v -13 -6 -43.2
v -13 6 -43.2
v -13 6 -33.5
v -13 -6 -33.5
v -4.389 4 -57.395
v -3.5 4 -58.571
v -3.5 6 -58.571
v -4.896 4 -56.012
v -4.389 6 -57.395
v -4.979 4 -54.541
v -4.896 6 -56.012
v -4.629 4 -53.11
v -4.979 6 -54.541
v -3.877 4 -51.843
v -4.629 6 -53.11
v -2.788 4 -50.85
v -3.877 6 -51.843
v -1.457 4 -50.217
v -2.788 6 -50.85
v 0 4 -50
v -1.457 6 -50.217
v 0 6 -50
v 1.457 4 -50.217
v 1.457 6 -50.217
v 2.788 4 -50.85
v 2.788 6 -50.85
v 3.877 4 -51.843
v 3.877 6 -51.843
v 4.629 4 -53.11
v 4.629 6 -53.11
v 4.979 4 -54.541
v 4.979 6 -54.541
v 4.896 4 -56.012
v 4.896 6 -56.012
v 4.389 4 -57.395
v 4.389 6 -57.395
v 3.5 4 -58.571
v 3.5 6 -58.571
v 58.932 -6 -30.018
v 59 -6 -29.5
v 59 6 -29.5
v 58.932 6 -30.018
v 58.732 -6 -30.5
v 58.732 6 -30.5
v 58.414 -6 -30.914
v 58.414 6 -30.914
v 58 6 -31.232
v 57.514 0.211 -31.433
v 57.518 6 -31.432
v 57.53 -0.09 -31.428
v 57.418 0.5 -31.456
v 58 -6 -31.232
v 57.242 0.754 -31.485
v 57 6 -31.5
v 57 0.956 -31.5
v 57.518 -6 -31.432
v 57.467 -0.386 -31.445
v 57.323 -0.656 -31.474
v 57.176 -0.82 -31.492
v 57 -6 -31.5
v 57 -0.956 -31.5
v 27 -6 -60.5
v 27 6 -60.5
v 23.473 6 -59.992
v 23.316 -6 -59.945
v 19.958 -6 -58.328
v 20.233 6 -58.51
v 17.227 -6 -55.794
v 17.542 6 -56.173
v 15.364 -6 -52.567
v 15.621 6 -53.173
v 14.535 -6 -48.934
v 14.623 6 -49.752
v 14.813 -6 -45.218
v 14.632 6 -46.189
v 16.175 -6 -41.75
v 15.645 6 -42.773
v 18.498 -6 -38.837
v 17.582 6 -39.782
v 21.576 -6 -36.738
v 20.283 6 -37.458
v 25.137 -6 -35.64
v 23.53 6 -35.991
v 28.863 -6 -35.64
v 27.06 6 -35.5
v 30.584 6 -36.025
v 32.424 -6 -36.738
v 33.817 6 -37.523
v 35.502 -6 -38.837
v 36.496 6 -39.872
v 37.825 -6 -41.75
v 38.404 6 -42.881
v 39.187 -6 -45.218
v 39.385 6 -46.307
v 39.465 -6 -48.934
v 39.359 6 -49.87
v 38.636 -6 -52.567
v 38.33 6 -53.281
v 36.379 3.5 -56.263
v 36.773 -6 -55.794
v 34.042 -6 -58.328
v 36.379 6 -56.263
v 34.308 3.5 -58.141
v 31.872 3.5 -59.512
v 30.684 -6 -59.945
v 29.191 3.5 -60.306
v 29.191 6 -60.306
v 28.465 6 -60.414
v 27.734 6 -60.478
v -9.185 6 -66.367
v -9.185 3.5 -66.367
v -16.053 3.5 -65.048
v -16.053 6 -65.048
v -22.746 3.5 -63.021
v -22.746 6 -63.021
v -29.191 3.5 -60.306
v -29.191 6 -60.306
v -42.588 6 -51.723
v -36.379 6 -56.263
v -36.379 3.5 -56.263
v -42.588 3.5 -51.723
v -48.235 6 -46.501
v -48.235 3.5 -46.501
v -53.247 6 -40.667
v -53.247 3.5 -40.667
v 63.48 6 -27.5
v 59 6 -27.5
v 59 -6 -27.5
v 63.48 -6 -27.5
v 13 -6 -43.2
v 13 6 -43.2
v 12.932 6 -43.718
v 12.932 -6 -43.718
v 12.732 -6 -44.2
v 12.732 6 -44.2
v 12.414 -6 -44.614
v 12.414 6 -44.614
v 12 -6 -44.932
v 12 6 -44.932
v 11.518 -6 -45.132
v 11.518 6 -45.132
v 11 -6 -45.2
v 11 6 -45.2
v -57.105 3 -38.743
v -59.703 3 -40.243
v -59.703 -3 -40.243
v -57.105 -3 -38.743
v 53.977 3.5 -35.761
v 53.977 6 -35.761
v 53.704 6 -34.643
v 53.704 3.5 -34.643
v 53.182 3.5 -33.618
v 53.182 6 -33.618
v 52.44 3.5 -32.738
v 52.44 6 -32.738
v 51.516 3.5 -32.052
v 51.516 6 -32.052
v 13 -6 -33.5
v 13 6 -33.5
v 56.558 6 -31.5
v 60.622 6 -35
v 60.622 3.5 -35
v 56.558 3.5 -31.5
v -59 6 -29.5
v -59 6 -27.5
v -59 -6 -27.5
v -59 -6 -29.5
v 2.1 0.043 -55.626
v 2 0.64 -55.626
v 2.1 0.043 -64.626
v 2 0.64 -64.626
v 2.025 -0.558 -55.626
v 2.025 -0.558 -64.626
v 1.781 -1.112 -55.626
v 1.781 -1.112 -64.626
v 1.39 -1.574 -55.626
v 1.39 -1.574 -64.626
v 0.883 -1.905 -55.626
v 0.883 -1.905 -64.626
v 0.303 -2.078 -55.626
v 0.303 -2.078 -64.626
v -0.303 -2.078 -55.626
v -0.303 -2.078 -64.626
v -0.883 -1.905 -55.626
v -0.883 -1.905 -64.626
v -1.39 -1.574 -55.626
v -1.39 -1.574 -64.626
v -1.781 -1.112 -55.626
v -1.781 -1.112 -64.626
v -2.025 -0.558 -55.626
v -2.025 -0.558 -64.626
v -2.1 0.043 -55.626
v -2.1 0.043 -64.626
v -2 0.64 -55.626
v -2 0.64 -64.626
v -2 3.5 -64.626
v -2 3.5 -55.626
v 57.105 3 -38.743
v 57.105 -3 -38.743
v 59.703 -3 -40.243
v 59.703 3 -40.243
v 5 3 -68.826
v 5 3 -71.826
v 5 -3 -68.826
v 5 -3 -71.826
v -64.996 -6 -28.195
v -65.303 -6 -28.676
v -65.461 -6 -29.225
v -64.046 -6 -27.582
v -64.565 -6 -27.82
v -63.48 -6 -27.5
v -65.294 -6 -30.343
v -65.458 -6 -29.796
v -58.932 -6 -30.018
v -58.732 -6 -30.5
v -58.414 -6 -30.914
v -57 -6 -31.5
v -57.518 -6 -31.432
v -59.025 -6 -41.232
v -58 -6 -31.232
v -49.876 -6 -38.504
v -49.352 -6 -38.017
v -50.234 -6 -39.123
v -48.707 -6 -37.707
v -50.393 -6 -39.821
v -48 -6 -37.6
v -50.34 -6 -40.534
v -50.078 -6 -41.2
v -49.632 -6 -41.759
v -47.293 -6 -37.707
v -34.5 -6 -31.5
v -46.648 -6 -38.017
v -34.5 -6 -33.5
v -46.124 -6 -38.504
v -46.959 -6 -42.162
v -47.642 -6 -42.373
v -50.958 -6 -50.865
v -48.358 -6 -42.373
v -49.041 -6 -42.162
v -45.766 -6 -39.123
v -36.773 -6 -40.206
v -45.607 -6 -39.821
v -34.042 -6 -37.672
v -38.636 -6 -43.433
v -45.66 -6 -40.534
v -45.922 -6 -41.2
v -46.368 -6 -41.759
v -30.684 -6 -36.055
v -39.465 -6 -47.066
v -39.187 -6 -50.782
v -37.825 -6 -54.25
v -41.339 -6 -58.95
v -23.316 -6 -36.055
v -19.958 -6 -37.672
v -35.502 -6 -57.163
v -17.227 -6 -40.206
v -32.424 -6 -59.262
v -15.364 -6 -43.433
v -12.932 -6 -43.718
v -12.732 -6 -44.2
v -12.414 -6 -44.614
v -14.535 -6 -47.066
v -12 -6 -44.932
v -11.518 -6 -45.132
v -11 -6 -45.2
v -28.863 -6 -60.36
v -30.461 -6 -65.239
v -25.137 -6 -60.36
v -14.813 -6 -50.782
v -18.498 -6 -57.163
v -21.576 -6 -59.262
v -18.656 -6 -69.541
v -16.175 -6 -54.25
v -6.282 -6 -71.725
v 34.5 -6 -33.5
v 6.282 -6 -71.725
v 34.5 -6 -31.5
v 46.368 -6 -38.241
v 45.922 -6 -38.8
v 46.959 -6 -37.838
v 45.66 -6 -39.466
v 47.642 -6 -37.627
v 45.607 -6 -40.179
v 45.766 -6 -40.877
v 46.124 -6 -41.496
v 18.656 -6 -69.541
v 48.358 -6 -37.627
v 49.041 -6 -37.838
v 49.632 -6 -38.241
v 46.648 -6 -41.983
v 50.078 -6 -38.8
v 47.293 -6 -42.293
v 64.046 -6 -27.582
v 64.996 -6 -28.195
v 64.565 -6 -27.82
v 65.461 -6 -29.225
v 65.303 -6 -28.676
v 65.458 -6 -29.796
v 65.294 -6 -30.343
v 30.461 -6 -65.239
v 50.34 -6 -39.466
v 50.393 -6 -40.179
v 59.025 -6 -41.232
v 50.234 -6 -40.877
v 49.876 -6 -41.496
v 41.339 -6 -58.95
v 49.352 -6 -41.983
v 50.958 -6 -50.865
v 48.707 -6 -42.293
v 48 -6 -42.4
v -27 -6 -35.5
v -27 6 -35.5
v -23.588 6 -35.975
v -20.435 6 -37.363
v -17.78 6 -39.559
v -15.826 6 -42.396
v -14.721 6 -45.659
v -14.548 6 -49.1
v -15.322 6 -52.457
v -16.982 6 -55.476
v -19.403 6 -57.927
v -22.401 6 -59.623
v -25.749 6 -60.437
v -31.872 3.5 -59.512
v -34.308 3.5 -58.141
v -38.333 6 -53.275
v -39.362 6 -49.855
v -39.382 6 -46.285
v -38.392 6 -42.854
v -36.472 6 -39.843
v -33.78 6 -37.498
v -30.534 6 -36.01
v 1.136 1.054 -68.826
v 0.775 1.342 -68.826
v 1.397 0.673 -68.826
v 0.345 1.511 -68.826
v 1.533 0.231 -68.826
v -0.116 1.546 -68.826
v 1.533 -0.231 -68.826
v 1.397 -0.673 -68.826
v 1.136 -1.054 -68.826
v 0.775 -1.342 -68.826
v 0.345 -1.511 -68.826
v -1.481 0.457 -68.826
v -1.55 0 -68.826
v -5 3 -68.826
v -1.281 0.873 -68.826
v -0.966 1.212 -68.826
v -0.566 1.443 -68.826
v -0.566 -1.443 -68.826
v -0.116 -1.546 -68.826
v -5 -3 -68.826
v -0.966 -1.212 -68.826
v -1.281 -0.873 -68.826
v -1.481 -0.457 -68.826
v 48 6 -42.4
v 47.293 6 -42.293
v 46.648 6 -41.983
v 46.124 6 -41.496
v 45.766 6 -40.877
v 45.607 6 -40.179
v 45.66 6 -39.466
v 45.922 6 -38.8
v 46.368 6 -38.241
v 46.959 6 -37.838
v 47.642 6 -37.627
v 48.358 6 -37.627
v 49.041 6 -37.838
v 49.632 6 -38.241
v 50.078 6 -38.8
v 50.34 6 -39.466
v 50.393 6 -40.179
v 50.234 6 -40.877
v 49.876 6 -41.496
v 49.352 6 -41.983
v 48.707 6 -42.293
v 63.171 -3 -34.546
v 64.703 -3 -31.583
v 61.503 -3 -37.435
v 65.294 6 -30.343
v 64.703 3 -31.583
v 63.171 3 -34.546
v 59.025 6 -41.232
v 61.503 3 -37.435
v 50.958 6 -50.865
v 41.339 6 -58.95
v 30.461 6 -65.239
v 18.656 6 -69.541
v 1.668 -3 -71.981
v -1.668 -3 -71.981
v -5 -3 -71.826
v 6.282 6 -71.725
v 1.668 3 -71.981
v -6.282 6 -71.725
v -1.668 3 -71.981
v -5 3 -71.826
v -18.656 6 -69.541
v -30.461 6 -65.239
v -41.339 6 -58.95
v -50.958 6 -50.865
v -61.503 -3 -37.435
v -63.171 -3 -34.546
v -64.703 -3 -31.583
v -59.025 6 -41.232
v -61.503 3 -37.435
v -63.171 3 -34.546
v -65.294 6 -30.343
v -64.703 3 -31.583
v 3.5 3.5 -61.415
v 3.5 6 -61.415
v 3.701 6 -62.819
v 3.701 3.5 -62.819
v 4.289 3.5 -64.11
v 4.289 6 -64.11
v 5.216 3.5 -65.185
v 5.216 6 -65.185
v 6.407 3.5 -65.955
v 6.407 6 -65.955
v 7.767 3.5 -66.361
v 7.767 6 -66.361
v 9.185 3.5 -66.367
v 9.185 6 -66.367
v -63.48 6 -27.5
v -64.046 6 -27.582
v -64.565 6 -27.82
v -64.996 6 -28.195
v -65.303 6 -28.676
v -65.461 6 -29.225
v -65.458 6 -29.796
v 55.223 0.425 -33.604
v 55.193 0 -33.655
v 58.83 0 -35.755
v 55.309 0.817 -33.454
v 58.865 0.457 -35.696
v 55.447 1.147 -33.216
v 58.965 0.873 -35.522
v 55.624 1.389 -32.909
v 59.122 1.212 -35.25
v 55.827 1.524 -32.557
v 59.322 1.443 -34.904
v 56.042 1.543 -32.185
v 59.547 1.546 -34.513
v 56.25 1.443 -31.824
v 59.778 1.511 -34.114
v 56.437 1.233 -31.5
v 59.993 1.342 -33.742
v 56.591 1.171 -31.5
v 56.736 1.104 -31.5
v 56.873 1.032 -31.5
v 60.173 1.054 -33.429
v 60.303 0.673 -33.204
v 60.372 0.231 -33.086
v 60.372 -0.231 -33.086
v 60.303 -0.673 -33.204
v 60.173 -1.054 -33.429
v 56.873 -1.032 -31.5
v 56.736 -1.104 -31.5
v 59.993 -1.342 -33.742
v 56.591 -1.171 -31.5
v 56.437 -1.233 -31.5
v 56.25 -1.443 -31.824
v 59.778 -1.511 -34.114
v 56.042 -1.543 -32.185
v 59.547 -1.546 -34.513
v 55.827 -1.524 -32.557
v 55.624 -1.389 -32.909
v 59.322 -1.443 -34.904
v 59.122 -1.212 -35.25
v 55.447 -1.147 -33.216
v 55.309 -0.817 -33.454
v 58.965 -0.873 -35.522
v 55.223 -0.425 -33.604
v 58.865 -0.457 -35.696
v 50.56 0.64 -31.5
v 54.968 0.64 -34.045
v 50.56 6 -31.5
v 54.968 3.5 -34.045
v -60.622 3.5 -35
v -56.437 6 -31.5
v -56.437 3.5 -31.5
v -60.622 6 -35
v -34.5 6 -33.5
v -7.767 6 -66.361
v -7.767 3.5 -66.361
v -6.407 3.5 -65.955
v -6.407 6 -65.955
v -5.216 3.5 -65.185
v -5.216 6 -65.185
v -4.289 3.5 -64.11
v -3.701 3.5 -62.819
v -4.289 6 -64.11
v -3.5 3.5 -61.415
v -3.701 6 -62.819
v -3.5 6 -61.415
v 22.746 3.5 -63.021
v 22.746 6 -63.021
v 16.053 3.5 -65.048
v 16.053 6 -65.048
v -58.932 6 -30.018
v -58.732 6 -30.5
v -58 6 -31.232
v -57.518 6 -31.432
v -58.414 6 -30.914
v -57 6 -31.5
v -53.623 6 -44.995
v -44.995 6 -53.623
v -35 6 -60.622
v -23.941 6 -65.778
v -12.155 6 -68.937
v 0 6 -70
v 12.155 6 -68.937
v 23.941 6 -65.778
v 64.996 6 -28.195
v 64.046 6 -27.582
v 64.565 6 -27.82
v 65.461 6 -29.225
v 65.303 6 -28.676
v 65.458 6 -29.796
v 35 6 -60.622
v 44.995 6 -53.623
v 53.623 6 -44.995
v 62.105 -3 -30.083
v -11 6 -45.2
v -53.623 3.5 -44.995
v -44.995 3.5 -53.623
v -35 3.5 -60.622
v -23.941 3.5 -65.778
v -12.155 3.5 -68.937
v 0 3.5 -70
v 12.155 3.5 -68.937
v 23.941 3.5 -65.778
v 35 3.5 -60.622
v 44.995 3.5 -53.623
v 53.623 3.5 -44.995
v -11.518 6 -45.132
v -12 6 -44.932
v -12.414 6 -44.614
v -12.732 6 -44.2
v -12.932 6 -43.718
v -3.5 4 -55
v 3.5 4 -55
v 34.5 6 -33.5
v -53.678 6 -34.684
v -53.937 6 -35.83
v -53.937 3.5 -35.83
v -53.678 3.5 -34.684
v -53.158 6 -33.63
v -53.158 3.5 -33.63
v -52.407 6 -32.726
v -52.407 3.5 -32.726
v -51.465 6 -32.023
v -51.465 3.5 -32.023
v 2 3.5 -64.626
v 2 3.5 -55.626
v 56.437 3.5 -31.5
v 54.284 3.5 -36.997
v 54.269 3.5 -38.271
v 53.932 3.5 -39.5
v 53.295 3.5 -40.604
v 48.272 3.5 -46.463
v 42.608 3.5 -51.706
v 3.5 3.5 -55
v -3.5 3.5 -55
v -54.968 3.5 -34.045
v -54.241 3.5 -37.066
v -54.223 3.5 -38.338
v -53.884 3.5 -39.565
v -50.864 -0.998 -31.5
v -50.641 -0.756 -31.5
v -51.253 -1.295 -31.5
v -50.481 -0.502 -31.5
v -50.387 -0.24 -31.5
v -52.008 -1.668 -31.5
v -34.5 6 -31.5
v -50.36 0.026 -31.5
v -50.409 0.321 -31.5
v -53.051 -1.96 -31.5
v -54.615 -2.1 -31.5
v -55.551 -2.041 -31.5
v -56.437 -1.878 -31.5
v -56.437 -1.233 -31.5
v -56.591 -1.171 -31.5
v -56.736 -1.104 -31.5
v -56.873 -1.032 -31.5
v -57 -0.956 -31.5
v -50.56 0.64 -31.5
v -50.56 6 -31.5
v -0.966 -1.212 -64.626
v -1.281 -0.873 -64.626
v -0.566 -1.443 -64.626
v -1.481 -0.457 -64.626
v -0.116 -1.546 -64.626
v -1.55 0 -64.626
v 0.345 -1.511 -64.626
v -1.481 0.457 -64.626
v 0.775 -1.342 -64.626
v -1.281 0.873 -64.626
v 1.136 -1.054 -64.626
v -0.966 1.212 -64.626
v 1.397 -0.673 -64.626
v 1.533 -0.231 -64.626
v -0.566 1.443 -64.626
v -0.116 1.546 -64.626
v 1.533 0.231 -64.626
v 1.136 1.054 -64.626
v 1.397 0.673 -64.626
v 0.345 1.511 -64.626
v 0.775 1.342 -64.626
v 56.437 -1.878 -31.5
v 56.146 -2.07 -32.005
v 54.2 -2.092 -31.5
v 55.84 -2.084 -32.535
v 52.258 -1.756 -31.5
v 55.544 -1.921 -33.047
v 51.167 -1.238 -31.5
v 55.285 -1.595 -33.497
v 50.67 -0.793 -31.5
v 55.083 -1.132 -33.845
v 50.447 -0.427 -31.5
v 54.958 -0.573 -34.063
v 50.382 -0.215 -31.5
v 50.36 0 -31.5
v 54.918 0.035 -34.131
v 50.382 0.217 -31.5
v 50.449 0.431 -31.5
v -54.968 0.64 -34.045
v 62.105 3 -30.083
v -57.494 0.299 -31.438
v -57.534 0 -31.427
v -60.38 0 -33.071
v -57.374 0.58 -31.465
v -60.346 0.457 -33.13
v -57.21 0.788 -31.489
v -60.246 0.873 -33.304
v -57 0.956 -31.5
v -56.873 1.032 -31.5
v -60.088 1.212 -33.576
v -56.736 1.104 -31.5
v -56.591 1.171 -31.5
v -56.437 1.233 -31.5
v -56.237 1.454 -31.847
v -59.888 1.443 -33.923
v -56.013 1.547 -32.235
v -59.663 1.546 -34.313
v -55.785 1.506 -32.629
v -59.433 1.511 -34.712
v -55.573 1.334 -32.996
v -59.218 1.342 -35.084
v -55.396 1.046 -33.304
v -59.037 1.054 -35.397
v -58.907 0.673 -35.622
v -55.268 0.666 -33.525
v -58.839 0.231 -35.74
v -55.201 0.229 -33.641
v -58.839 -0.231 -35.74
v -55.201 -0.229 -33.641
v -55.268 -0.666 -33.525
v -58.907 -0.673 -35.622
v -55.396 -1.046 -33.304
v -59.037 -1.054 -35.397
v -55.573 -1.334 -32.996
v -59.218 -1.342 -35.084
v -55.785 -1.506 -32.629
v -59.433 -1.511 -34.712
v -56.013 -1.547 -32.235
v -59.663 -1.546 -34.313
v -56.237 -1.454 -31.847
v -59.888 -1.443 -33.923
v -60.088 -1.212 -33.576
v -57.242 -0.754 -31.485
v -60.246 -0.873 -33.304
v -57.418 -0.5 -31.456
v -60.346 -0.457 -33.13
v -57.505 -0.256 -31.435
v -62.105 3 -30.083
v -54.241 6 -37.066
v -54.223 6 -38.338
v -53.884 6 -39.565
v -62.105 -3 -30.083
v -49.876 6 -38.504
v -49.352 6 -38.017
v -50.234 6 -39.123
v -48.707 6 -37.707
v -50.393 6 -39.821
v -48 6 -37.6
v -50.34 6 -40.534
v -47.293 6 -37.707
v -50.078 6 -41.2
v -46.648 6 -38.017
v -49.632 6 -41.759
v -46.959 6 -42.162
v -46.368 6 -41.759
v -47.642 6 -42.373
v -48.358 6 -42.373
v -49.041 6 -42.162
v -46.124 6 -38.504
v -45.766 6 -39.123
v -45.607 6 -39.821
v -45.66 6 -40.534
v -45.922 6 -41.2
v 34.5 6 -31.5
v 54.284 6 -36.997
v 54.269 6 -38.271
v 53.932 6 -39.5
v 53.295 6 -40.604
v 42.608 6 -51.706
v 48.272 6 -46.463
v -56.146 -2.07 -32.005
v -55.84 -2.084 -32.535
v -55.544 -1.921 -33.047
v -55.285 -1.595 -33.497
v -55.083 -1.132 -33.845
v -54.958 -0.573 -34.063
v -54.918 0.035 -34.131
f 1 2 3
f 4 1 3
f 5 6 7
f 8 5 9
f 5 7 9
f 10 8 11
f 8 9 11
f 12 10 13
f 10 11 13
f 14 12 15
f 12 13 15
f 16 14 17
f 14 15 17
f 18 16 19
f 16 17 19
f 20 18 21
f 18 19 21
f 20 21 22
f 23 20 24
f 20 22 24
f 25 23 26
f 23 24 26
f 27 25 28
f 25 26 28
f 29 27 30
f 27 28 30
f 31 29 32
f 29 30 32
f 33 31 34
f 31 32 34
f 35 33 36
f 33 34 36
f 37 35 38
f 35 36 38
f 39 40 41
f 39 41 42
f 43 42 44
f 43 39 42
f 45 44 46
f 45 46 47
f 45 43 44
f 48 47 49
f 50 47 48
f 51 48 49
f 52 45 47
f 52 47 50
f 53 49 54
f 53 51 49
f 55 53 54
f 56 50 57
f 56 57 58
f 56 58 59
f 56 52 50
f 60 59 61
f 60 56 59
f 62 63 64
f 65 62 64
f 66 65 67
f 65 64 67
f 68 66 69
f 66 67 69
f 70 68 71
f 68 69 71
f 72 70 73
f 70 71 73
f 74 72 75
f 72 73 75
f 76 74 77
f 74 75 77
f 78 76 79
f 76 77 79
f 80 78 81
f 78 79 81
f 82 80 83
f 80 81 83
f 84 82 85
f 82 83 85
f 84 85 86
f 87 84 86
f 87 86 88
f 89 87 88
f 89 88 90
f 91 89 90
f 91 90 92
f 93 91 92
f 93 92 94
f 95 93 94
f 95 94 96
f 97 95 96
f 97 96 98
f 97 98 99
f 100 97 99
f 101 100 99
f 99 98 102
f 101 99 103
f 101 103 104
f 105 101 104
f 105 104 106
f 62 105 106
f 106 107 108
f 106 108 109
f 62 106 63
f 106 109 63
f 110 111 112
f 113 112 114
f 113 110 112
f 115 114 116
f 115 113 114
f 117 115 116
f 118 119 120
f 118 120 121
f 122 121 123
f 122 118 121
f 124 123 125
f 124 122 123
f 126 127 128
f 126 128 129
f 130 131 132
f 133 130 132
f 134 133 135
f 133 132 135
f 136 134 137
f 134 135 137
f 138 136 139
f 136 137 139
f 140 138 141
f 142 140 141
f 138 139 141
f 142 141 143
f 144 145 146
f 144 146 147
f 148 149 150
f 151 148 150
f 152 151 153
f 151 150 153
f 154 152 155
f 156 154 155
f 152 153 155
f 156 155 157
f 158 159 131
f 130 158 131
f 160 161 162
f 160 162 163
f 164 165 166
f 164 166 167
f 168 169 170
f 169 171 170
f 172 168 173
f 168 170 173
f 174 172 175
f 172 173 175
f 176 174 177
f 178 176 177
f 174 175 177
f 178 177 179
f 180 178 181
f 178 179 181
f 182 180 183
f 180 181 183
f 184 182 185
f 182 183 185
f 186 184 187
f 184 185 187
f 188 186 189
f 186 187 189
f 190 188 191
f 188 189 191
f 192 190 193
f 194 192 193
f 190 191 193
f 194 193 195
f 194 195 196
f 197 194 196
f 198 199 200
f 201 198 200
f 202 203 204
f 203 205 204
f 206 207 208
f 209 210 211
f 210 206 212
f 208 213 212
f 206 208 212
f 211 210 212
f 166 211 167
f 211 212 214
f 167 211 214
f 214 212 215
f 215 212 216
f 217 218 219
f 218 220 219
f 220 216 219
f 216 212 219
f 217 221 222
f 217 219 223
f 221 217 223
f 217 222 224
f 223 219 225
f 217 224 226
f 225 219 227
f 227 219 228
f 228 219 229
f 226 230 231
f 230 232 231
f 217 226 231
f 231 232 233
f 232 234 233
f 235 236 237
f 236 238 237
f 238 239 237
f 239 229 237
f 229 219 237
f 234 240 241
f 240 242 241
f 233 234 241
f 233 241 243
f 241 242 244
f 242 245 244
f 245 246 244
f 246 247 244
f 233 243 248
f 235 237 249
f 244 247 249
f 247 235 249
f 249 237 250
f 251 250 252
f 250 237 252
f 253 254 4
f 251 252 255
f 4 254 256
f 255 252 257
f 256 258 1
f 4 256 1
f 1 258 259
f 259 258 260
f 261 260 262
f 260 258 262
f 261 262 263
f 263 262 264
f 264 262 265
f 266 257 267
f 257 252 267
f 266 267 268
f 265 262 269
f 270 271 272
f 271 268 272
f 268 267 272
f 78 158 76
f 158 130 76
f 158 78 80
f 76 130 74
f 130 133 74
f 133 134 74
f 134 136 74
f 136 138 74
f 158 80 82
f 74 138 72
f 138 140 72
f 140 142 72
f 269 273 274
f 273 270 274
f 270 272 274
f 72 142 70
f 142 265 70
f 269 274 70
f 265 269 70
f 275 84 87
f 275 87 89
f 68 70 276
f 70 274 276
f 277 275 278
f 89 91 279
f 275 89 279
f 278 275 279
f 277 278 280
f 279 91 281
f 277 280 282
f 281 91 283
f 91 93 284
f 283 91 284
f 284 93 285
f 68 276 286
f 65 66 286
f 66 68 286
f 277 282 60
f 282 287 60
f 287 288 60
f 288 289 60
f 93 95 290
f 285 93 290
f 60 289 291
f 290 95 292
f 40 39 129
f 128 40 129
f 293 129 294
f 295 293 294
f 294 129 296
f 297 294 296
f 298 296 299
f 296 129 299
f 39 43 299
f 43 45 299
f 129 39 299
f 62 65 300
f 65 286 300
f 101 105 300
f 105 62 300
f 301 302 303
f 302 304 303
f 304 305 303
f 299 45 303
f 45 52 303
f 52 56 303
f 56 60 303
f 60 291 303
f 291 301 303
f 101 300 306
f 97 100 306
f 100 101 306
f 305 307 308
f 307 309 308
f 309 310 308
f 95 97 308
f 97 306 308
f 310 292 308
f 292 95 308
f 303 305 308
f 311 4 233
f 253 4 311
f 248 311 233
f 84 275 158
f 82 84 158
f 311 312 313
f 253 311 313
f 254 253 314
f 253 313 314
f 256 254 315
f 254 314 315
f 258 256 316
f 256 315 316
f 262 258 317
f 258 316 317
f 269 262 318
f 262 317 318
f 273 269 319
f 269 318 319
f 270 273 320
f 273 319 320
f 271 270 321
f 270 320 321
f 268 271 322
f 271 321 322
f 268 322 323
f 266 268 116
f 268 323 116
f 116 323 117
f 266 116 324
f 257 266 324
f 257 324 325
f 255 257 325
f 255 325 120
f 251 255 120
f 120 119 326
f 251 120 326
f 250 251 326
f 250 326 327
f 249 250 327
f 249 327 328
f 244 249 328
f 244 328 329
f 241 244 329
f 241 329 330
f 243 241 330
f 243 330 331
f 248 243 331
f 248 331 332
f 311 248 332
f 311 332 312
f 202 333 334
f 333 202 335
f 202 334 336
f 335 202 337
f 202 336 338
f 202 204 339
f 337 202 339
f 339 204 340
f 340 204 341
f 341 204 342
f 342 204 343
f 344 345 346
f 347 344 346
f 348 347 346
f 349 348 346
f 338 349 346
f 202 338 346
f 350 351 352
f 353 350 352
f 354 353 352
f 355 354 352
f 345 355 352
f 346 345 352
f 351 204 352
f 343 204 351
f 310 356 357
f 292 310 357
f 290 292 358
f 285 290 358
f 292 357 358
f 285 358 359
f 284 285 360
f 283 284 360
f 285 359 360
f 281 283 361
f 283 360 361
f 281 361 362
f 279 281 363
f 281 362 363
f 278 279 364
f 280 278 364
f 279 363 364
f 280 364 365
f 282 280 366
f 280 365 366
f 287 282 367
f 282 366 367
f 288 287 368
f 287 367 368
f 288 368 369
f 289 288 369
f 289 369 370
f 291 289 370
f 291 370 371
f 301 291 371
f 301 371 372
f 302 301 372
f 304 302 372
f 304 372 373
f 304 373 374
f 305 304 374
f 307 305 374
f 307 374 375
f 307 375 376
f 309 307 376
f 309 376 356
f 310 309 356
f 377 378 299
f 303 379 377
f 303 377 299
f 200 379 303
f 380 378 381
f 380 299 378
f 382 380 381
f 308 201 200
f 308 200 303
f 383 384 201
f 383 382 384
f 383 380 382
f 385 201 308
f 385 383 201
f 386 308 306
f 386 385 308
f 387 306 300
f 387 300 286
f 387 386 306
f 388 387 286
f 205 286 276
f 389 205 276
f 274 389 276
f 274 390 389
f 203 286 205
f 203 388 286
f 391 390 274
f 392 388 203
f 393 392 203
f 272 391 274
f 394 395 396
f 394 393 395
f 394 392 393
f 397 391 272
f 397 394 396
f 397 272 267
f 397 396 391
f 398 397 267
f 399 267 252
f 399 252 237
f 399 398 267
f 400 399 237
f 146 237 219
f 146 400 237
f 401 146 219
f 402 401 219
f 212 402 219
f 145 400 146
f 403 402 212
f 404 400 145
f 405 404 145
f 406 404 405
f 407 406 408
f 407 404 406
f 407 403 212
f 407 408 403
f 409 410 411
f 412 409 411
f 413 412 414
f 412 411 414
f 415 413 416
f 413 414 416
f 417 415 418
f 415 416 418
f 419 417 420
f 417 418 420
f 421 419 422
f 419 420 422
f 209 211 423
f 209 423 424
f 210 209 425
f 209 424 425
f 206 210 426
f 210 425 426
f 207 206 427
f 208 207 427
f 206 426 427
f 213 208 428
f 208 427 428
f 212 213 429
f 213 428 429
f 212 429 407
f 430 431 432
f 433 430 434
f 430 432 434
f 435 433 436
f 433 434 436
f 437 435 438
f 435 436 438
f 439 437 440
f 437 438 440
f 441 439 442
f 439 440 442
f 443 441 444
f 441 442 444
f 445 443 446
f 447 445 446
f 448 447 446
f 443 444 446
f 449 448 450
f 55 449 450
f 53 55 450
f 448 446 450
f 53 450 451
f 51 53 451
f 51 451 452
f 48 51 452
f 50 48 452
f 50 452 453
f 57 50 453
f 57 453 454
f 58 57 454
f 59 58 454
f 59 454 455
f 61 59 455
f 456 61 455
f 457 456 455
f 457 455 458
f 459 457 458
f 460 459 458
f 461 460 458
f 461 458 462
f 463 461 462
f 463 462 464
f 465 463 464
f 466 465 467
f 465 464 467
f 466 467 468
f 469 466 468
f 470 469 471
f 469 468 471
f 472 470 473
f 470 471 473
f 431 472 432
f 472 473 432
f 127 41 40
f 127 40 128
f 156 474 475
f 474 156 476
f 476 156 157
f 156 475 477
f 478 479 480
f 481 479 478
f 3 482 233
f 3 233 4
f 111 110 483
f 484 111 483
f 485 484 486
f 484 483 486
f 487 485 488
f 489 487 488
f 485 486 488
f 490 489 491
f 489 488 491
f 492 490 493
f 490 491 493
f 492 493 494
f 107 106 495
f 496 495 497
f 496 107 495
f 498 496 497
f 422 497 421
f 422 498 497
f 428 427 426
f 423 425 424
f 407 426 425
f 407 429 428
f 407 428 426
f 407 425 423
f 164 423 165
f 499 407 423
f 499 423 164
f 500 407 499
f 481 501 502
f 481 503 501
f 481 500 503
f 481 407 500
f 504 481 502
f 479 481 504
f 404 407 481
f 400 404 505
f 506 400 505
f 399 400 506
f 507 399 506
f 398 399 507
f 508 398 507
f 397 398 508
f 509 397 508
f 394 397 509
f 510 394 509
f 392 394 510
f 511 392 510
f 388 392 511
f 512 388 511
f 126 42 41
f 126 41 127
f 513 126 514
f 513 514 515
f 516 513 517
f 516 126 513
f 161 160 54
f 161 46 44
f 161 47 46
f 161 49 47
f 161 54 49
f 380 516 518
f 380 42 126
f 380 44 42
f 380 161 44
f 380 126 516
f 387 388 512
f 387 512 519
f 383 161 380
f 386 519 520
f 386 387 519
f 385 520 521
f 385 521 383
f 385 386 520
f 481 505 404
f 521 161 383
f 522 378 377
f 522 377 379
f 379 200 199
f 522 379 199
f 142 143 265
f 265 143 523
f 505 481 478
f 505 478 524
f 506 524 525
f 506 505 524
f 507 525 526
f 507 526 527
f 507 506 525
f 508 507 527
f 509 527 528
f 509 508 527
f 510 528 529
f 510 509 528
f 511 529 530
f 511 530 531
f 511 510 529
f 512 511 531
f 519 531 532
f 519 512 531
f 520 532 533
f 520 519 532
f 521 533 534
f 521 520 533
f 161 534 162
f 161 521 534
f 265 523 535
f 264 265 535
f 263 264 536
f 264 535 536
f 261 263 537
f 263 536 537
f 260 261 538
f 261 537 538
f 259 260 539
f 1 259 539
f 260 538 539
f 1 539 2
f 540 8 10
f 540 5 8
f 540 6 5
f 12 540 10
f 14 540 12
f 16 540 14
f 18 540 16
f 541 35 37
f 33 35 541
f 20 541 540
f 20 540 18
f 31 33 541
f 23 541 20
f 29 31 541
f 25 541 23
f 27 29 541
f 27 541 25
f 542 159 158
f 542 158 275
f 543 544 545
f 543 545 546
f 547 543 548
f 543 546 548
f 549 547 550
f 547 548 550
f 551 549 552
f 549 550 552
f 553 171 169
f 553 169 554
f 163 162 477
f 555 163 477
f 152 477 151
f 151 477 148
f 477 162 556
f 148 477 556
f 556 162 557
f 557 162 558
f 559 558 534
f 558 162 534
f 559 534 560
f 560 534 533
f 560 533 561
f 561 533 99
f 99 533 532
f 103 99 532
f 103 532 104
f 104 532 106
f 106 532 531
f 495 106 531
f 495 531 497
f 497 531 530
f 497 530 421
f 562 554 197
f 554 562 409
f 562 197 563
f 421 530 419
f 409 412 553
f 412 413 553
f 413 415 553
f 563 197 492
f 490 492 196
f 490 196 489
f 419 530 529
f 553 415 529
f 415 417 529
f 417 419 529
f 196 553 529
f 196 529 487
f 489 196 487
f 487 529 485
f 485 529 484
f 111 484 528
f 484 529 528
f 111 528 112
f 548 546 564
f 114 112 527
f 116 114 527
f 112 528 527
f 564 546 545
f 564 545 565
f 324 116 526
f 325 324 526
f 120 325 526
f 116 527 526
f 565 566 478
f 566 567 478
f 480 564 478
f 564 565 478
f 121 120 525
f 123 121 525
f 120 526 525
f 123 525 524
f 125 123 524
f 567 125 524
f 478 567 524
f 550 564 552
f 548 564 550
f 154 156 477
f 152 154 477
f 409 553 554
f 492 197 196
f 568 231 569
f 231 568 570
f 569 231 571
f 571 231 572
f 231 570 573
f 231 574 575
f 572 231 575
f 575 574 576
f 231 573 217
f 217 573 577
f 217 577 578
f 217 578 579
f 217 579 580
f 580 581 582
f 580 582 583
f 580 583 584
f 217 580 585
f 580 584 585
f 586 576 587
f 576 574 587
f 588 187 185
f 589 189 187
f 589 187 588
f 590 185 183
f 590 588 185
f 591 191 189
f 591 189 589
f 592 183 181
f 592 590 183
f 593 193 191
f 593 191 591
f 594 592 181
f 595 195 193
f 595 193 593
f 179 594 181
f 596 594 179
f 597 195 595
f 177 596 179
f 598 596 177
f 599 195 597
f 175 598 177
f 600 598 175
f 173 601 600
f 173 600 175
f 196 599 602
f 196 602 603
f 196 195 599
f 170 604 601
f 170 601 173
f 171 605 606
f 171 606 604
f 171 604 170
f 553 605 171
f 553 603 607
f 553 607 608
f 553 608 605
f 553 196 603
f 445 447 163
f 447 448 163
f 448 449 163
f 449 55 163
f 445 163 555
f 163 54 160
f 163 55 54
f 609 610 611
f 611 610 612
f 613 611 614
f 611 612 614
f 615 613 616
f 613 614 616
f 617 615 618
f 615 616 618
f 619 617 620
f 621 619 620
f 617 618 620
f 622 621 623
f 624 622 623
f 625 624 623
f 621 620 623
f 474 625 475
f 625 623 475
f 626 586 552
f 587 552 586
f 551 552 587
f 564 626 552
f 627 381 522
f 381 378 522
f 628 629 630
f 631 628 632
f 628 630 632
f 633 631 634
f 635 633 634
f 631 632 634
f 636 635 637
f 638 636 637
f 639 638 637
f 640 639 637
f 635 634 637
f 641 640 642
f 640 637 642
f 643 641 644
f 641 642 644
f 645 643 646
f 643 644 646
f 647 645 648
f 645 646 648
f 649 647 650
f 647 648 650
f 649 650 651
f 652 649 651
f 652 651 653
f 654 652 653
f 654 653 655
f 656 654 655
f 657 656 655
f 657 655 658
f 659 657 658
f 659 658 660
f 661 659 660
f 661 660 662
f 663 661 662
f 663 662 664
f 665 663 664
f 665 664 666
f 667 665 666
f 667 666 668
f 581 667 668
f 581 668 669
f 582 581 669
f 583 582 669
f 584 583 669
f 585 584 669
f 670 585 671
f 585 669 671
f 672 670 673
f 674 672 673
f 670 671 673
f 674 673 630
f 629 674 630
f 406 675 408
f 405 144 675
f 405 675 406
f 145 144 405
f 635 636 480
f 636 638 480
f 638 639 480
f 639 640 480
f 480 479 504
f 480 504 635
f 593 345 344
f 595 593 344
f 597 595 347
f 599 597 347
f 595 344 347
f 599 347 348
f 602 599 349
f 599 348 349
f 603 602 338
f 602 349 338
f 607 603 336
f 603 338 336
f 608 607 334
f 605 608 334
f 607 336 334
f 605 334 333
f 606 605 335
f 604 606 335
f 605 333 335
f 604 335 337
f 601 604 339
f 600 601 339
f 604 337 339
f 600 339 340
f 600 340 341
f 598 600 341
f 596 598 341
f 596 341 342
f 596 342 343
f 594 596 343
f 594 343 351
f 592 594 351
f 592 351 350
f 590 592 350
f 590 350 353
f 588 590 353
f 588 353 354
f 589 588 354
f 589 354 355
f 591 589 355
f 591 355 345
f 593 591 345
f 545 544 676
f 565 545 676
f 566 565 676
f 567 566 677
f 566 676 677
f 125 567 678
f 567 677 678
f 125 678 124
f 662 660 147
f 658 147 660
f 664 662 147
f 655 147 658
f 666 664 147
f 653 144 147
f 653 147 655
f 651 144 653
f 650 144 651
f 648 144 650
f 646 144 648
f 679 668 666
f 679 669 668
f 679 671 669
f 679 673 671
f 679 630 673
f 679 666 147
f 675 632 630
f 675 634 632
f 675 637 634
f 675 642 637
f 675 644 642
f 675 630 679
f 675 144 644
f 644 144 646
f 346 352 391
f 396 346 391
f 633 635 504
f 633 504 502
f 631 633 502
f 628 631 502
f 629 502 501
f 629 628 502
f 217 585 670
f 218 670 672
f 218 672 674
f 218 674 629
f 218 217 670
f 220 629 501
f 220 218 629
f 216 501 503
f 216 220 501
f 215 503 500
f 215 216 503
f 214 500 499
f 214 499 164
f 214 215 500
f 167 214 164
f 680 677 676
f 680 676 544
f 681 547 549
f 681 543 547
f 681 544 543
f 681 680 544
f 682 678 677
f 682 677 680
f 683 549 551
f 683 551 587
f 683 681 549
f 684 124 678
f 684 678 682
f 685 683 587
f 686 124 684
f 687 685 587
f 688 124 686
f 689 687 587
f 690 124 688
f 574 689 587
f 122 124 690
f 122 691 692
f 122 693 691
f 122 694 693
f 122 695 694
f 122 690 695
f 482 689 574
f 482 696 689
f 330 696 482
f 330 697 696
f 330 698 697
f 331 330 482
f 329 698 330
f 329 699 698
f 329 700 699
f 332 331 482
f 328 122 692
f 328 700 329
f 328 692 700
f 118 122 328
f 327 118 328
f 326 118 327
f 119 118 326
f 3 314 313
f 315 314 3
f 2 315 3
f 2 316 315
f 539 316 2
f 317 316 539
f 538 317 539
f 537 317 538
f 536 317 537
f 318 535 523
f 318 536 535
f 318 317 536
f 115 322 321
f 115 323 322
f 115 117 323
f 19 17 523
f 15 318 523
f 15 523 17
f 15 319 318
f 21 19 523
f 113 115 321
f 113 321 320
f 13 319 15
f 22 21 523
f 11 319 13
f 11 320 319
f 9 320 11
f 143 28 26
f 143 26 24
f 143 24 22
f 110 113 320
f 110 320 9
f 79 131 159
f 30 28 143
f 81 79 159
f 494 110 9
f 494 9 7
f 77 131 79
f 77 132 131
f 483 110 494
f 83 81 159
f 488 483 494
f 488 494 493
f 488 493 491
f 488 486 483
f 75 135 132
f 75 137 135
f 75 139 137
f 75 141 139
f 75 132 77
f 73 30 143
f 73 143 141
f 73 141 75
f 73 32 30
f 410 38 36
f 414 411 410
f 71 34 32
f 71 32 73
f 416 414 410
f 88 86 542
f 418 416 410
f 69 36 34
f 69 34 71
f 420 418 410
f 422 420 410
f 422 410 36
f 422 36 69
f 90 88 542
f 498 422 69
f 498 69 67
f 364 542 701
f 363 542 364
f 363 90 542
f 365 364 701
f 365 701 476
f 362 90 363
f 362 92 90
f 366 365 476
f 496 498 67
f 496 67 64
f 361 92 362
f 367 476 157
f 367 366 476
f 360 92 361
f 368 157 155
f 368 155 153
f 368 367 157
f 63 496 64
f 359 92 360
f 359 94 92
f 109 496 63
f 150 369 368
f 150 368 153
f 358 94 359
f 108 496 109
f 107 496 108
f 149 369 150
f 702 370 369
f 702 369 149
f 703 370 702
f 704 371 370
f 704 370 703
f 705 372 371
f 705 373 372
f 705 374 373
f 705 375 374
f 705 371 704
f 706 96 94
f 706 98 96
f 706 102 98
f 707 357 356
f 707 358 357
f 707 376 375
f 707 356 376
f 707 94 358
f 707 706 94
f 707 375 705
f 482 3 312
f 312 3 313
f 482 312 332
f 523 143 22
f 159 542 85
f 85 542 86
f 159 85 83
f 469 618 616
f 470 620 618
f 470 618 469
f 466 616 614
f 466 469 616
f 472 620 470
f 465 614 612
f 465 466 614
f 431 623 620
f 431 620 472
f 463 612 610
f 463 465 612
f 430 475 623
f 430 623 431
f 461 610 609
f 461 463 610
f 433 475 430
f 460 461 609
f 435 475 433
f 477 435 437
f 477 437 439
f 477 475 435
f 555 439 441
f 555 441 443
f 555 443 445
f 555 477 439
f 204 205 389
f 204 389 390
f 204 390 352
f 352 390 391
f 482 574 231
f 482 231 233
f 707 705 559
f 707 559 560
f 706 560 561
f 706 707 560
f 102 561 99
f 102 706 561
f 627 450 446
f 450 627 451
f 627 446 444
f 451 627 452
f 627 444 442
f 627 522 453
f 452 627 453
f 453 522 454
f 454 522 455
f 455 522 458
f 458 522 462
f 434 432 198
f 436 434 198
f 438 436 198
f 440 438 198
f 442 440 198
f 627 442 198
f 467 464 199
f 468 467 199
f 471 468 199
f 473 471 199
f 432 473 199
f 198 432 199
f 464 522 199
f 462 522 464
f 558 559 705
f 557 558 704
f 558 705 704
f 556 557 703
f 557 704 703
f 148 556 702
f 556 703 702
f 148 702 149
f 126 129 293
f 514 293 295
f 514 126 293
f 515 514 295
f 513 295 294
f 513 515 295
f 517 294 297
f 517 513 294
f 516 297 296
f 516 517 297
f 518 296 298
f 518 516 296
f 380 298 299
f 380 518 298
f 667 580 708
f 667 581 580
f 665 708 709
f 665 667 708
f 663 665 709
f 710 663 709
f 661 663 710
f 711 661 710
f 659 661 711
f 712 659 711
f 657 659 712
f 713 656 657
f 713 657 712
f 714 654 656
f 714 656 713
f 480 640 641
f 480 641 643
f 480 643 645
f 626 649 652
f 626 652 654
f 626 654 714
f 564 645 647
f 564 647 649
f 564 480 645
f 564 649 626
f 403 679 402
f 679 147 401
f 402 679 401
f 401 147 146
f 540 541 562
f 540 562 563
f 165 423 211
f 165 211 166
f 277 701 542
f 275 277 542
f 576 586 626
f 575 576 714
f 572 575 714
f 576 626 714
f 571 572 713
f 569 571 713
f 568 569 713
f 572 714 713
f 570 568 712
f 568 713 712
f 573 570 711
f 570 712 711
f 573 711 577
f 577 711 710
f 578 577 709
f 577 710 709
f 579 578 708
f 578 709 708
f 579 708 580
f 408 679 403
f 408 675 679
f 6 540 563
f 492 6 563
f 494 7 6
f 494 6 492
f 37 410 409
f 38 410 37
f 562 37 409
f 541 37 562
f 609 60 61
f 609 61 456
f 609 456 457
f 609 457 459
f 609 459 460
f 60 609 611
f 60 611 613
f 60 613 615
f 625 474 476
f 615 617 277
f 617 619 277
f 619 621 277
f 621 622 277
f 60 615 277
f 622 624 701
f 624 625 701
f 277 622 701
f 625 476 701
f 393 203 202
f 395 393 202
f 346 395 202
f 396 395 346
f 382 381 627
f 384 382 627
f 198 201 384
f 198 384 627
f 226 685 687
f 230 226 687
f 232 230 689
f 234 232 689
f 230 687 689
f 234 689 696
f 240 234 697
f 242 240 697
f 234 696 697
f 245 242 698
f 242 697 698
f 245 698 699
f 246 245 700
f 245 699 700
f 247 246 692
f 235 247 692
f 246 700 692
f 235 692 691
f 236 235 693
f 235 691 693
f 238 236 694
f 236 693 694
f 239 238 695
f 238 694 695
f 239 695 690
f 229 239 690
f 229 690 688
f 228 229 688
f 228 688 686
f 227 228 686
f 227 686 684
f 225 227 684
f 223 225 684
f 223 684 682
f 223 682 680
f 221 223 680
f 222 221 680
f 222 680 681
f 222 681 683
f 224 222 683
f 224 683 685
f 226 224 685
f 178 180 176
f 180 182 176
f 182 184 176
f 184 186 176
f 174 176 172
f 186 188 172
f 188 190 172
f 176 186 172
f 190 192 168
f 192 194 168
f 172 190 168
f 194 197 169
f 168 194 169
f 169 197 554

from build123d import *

# Parameters (mm, degrees)
BOSS_EXTRUDE1_DEPTH  = 6
SOLENOID_PLACEMENT_W = 38
SOLENOID_PLACEMENT_H = 64
CUT_EXTRUDE1_DEPTH   = 103.528044944
CUT_EXTRUDE4_DEPTH   = 103.528044944
SKETCH5_R            = 12.5
CUT_EXTRUDE5_DEPTH   = 103.528044944
SKETCH6_R            = 2.4
CUT_EXTRUDE6_DEPTH   = 103.528044944
CUT_EXTRUDE3_DEPTH   = 103.528044944
FILLET1_R            = 2
CUT_EXTRUDE7_DEPTH   = 3
SKETCH10_R           = 5
CUT_EXTRUDE9_DEPTH   = 2
SKETCH11_W           = 69
SKETCH11_H           = 67
CUT_EXTRUDE10_DEPTH  = 99.059529102
SKETCH13_R           = 1.55
CUT_EXTRUDE11_DEPTH  = 4.2
SKETCH14_R           = 2.1
CUT_EXTRUDE12_DEPTH  = 9
SKETCH15_W           = 4
SKETCH15_H           = 10.882727098
CUT_EXTRUDE13_DEPTH  = 9
CIRPATTERN1_COUNT    = 3
CIRPATTERN1_ANGLE    = 120
CUT_EXTRUDE14_DEPTH  = 2.5
FILLET2_R            = 5


with BuildPart() as part:
    # Sketch1 → Boss-Extrude1 (new, symmetric)
    with BuildSketch(Plane(origin=(0, 0, 0), x_dir=(1, 0, 0), z_dir=(0, 1, 0))):
        with BuildLine():
            ThreePointArc((36.224522061, -62.223661106), (0, 72), (-36.224522061, -62.223661106))
            ThreePointArc((-36.224522061, -62.223661106), (-32.797800029, -62.818856853), (-29.811944095, -61.035223988))
            ThreePointArc((-29.811944095, -61.035223988), (0, -46.75), (29.811944095, -61.035223988))
            ThreePointArc((29.811944095, -61.035223988), (32.797800029, -62.818856853), (36.224522061, -62.223661106))
        make_face()
    extrude(amount=BOSS_EXTRUDE1_DEPTH, both=True)

    # solenoid placement → Cut-Extrude1 (cut, through all)
    with BuildSketch(Plane(origin=(0, 6, 0), x_dir=(1, 0, 0), z_dir=(0, 1, 0))):
        with Locations((0, -4)):
            Rectangle(SOLENOID_PLACEMENT_W, SOLENOID_PLACEMENT_H)
    extrude(amount=-CUT_EXTRUDE1_DEPTH, mode=Mode.SUBTRACT)

    # Sketch4 → Cut-Extrude4 (cut, through all)
    with BuildSketch(Plane(origin=(0, 6, 0), x_dir=(1, 0, 0), z_dir=(0, 1, 0))):
        with BuildLine():
            Line((-13, 28), (13, 28))
            Line((13, 28), (13, 43.2))
            ThreePointArc((13, 43.2), (12.414213562, 44.614213562), (11, 45.2))
            Line((11, 45.2), (-11, 45.2))
            ThreePointArc((-11, 45.2), (-12.414213562, 44.614213562), (-13, 43.2))
            Line((-13, 43.2), (-13, 28))
        make_face()
    extrude(amount=-CUT_EXTRUDE4_DEPTH, mode=Mode.SUBTRACT)

    # Sketch5 → Cut-Extrude5 (cut, through all)
    with BuildSketch(Plane(origin=(0, 6, 0), x_dir=(1, 0, 0), z_dir=(0, 1, 0))):
        with Locations(Location((27, 48, 0), (0, 0, 90))):
            Circle(SKETCH5_R)
        with Locations(Location((-27, 48, 0), (0, 0, 270))):
            Circle(SKETCH5_R)
    extrude(amount=-CUT_EXTRUDE5_DEPTH, mode=Mode.SUBTRACT)

    # Sketch6 → Cut-Extrude6 (cut, through all)
    with BuildSketch(Plane(origin=(0, 6, 0), x_dir=(1, 0, 0), z_dir=(0, 1, 0))):
        with Locations(Location((48, 40, 0), (0, 0, 90))):
            Circle(SKETCH6_R)
        with Locations(Location((-48, 40, 0), (0, 0, 270))):
            Circle(SKETCH6_R)
    extrude(amount=-CUT_EXTRUDE6_DEPTH, mode=Mode.SUBTRACT)

    # Sketch3 → Cut-Extrude3 (cut, through all)
    with BuildSketch(Plane(origin=(0, 6, 0), x_dir=(1, 0, 0), z_dir=(0, 1, 0))):
        Polygon((-72, -31.5), (-72, 27.5), (-59, 27.5), (-59, 31.5), (0, 31.5), (59, 31.5), (59, 27.5), (72, 27.5), (72, -31.5), (72, -101.646422462), (-72, -101.646422462), align=None)
    extrude(amount=-CUT_EXTRUDE3_DEPTH, mode=Mode.SUBTRACT)

    # Fillet1
    fillet1_edges = [part.edges().sort_by_distance(p)[0] for p in [
        (-66.541340534, 0, -27.5),
        (66.541340534, 0, -27.5),
        (-59, 0, -31.5),
        (59, 0, -31.5),
    ]]
    fillet(fillet1_edges, radius=FILLET1_R)

    # Sketch8 → Cut-Extrude7 (cut, symmetric)
    with BuildSketch(Plane(origin=(0, 0, 0), x_dir=(1, 0, 0), z_dir=(0, 1, 0))):
        with BuildLine():
            Line((5, 71.826179071), (5, 68.826179071))
            Line((5, 68.826179071), (-5, 68.826179071))
            Line((-5, 68.826179071), (-5, 71.826179071))
            ThreePointArc((-5, 71.826179071), (0, 72), (5, 71.826179071))
        make_face()
        with BuildLine():
            Line((64.703295733, 31.582962517), (62.105219521, 30.082962517))
            Line((62.105219521, 30.082962517), (57.105219521, 38.743216555))
            Line((57.105219521, 38.743216555), (59.703295733, 40.243216555))
            ThreePointArc((59.703295733, 40.243216555), (62.353829072, 36), (64.703295733, 31.582962517))
        make_face()
        with BuildLine():
            Line((-59.703295733, 40.243216555), (-57.105219521, 38.743216555))
            Line((-57.105219521, 38.743216555), (-62.105219521, 30.082962517))
            Line((-62.105219521, 30.082962517), (-64.703295733, 31.582962517))
            ThreePointArc((-64.703295733, 31.582962517), (-62.353829072, 36), (-59.703295733, 40.243216555))
        make_face()
    extrude(amount=CUT_EXTRUDE7_DEPTH, both=True, mode=Mode.SUBTRACT)

    # Sketch10 → Cut-Extrude9 (cut)
    with BuildSketch(Plane(origin=(0, 6, 0), x_dir=(1, 0, 0), z_dir=(0, 1, 0))):
        with Locations(Location((0, 55, 0), (0, 0, 270))):
            Circle(SKETCH10_R)
    extrude(amount=-CUT_EXTRUDE9_DEPTH, mode=Mode.SUBTRACT)

    # Sketch11 → Cut-Extrude10 (cut, through all)
    with BuildSketch(Plane(origin=(0, 6, 0), x_dir=(1, 0, 0), z_dir=(0, 1, 0))):
        Rectangle(SKETCH11_W, SKETCH11_H)
    extrude(amount=-CUT_EXTRUDE10_DEPTH, mode=Mode.SUBTRACT)

    # Sketch13 → Cut-Extrude11 (cut)
    with BuildSketch(Plane(origin=(-59.605219521, 0, -34.413089536), x_dir=(-0.5000000000000001, 0, 0.8660254037844386), z_dir=(-0.8660254037844386, 0, -0.5000000000000001))):
        Circle(SKETCH13_R)
    cut_extrude11 = extrude(amount=-CUT_EXTRUDE11_DEPTH, mode=Mode.SUBTRACT)

    # Sketch14 → Cut-Extrude12 (cut)
    with BuildSketch(Plane(origin=(-55.967912825, 0, -32.313089536), x_dir=(-0.5000000000000001, 0, 0.8660254037844386), z_dir=(-0.8660254037844386, 0, -0.5000000000000001))):
        Circle(SKETCH14_R)
    cut_extrude12 = extrude(amount=-CUT_EXTRUDE12_DEPTH, mode=Mode.SUBTRACT)

    # Sketch15 → Cut-Extrude13 (cut)
    with BuildSketch(Plane(origin=(-55.967912825, 0, -32.313089536), x_dir=(0.5000000000000001, 0, -0.8660254037844386), z_dir=(0.8660254037844386, 0, 0.5000000000000001))):
        with Locations((0, 5.441363549)):
            Rectangle(SKETCH15_W, SKETCH15_H)
    cut_extrude13 = extrude(amount=CUT_EXTRUDE13_DEPTH, mode=Mode.SUBTRACT)

    # CirPattern1: Cut-Extrude11, Cut-Extrude12, Cut-Extrude13 ×3 about axis
    cirpattern1_axis = Axis((0, 0, 0), (0, -1, 0))
    add([cut_extrude11.rotate(cirpattern1_axis, i * CIRPATTERN1_ANGLE / (CIRPATTERN1_COUNT - 1)) for i in range(1, CIRPATTERN1_COUNT)], mode=Mode.SUBTRACT)
    add([cut_extrude12.rotate(cirpattern1_axis, i * CIRPATTERN1_ANGLE / (CIRPATTERN1_COUNT - 1)) for i in range(1, CIRPATTERN1_COUNT)], mode=Mode.SUBTRACT)
    add([cut_extrude13.rotate(cirpattern1_axis, i * CIRPATTERN1_ANGLE / (CIRPATTERN1_COUNT - 1)) for i in range(1, CIRPATTERN1_COUNT)], mode=Mode.SUBTRACT)

    # Sketch16 → Cut-Extrude14 (cut)
    with BuildSketch(Plane(origin=(0, 6, 0), x_dir=(1, 0, 0), z_dir=(0, 1, 0))):
        with BuildLine():
            Line((-56.437350288, 31.5), (-60.621778265, 35))
            ThreePointArc((-60.621778265, 35), (0, 70), (60.621778265, 35))
            Line((60.621778265, 35), (56.477458213, 31.430531036))
            Line((56.477458213, 31.430531036), (53.977458213, 35.760658055))
            Line((53.977458213, 35.760658055), (55.69643641, 37.241199916))
            ThreePointArc((55.69643641, 37.241199916), (33.107279951, 58.248673927), (3.5, 66.908519637))
            Line((3.5, 66.908519637), (3.5, 55))
            Line((3.5, 55), (-3.5, 55))
            Line((-3.5, 55), (-3.5, 66.908519637))
            ThreePointArc((-3.5, 66.908519637), (-33.087061005, 58.260161295), (-55.670571638, 37.279853185))
            Line((-55.670571638, 37.279853185), (-53.937350288, 35.830127019))
            Line((-53.937350288, 35.830127019), (-56.437350288, 31.5))
        make_face()
    extrude(amount=-CUT_EXTRUDE14_DEPTH, mode=Mode.SUBTRACT)

    # Fillet2
    # the kernel refuses this fillet: 5 mm, written as the material it takes off along each edge
    with BuildSketch(Plane(origin=(55.69643641, 16.329932335, -37.241199916), x_dir=(-0.5812078308679164, 0, -0.8137551581021232), z_dir=(0, -1, 0))) as fillet2_piece_1:
        with BuildLine():
            CenterArc((3.97779484, -4.997622346), FILLET2_R, 88.232969076, 58.560507528)
            Line((-0.205714987, -2.259329899), (-0.289385184, -2.20456405))
            ThreePointArc((-0.289385184, -2.20456405), (-0.202445536, -1.120597326), (-0.099588042, 0.009067624))
            Line((-0.099588042, 0.009067624), (-0.003083562, 0.099952447))
            ThreePointArc((-0.003083562, 0.099952447), (2.065986467, 0.131860561), (4.135056496, 0.099952447))
            Line((4.135056496, 0.099952447), (4.131972934, 0))
        make_face()
    extrude(amount=12.829932335, mode=Mode.SUBTRACT)
    with BuildSketch(Plane(origin=(-3.5, 20.277950053, -66.908519637), x_dir=(-0.9955007283712978, 0, 0.09475389074975102), z_dir=(0, -1, 0))) as fillet2_piece_2:
        with BuildLine():
            CenterArc((5.498076289, -4.995456616), FILLET2_R, 87.557271181, 97.879883712)
            Line((0.520572647, -5.469226069), (0.421022574, -5.478701459))
            Line((0.421022574, -5.478701459), (-0.099550073, -0.009475389))
            Line((-0.099550073, -0.009475389), (-0.004262075, 0.099909132))
            ThreePointArc((-0.004262075, 0.099909132), (2.855590011, 0.16088135), (5.715442096, 0.099909132))
            Line((5.715442096, 0.099909132), (5.711180021, 0))
        make_face()
    extrude(amount=16.777950053, mode=Mode.SUBTRACT)
    with BuildSketch(Plane(origin=(3.5, 20.277950053, -66.908519637), x_dir=(0.9955007283712978, 0, 0.09475389074975099), z_dir=(0, -1, 0))) as fillet2_piece_3:
        with BuildLine():
            CenterArc((5.498076289, 4.995456616), FILLET2_R, 174.562845107, 97.879883712)
            Line((0.520572647, 5.469226069), (0.421022574, 5.478701459))
            Line((0.421022574, 5.478701459), (-0.099550073, 0.009475389))
            Line((-0.099550073, 0.009475389), (-0.004262075, -0.099909132))
            ThreePointArc((-0.004262075, -0.099909132), (2.855590011, -0.16088135), (5.715442096, -0.099909132))
            Line((5.715442096, -0.099909132), (5.711180021, 0))
        make_face()
    extrude(amount=16.777950053, mode=Mode.SUBTRACT)
    with BuildSketch(Plane(origin=(-55.670571638, 16.411618265, -37.279853185), x_dir=(0.581970971434149, 0, -0.8132095599585589), z_dir=(0, -1, 0))) as fillet2_piece_4:
        with BuildLine():
            CenterArc((4.009250019, 4.997584585), FILLET2_R, 213.290400287, 58.490608258)
            Line((-0.170246664, 2.253170717), (-0.253836598, 2.198282439))
            ThreePointArc((-0.253836598, 2.198282439), (-0.184839093, 1.119050965), (-0.099715761, -0.007534394))
            Line((-0.099715761, -0.007534394), (-0.003107946, -0.099951692))
            ThreePointArc((-0.003107946, -0.099951692), (2.082323653, -0.132366563), (4.167755252, -0.099951692))
            Line((4.167755252, -0.099951692), (4.164647306, 0))
        make_face()
    extrude(amount=12.911618265, mode=Mode.SUBTRACT)
    with BuildSketch(Plane(origin=(54.967912825, 15.964026198, -34.045140343), x_dir=(-0.8660254037844403, 0, 0.4999999999999973), z_dir=(0, -1, 0))) as fillet2_piece_5:
        with BuildLine():
            CenterArc((3.985610479, 5), FILLET2_R, 217.143845078, 52.856154922)
            Line((0, 1.980909225), (-0.07971221, 1.92052741))
            ThreePointArc((-0.07971221, 1.92052741), (-0.1, 0.990454613), (-0.1, 0))
            Line((-0.1, 0), (0, -0.1))
            Line((0, -0.1), (3.985610479, -0.1))
            Line((3.985610479, -0.1), (3.985610479, 0))
        make_face()
    extrude(amount=12.464026198, mode=Mode.SUBTRACT)
    with BuildSketch(Plane(origin=(-54.967912825, 3.5, -34.045140343), x_dir=(0.8660254037844386, 0, 0.5), z_dir=(0, 1, 0))) as fillet2_piece_6:
        with BuildLine():
            CenterArc((4.04512227, 5), FILLET2_R, 215.999272853, 54.000727147)
            Line((0, 2.061125075), (-0.080902445, 2.002347577))
            ThreePointArc((-0.080902445, 2.002347577), (-0.1, 1.030562538), (-0.1, 0))
            Line((-0.1, 0), (0, -0.1))
            Line((0, -0.1), (4.04512227, -0.1))
            Line((4.04512227, -0.1), (4.04512227, 0))
        make_face()
    extrude(amount=12.612805674, mode=Mode.SUBTRACT)


solid = part.part
